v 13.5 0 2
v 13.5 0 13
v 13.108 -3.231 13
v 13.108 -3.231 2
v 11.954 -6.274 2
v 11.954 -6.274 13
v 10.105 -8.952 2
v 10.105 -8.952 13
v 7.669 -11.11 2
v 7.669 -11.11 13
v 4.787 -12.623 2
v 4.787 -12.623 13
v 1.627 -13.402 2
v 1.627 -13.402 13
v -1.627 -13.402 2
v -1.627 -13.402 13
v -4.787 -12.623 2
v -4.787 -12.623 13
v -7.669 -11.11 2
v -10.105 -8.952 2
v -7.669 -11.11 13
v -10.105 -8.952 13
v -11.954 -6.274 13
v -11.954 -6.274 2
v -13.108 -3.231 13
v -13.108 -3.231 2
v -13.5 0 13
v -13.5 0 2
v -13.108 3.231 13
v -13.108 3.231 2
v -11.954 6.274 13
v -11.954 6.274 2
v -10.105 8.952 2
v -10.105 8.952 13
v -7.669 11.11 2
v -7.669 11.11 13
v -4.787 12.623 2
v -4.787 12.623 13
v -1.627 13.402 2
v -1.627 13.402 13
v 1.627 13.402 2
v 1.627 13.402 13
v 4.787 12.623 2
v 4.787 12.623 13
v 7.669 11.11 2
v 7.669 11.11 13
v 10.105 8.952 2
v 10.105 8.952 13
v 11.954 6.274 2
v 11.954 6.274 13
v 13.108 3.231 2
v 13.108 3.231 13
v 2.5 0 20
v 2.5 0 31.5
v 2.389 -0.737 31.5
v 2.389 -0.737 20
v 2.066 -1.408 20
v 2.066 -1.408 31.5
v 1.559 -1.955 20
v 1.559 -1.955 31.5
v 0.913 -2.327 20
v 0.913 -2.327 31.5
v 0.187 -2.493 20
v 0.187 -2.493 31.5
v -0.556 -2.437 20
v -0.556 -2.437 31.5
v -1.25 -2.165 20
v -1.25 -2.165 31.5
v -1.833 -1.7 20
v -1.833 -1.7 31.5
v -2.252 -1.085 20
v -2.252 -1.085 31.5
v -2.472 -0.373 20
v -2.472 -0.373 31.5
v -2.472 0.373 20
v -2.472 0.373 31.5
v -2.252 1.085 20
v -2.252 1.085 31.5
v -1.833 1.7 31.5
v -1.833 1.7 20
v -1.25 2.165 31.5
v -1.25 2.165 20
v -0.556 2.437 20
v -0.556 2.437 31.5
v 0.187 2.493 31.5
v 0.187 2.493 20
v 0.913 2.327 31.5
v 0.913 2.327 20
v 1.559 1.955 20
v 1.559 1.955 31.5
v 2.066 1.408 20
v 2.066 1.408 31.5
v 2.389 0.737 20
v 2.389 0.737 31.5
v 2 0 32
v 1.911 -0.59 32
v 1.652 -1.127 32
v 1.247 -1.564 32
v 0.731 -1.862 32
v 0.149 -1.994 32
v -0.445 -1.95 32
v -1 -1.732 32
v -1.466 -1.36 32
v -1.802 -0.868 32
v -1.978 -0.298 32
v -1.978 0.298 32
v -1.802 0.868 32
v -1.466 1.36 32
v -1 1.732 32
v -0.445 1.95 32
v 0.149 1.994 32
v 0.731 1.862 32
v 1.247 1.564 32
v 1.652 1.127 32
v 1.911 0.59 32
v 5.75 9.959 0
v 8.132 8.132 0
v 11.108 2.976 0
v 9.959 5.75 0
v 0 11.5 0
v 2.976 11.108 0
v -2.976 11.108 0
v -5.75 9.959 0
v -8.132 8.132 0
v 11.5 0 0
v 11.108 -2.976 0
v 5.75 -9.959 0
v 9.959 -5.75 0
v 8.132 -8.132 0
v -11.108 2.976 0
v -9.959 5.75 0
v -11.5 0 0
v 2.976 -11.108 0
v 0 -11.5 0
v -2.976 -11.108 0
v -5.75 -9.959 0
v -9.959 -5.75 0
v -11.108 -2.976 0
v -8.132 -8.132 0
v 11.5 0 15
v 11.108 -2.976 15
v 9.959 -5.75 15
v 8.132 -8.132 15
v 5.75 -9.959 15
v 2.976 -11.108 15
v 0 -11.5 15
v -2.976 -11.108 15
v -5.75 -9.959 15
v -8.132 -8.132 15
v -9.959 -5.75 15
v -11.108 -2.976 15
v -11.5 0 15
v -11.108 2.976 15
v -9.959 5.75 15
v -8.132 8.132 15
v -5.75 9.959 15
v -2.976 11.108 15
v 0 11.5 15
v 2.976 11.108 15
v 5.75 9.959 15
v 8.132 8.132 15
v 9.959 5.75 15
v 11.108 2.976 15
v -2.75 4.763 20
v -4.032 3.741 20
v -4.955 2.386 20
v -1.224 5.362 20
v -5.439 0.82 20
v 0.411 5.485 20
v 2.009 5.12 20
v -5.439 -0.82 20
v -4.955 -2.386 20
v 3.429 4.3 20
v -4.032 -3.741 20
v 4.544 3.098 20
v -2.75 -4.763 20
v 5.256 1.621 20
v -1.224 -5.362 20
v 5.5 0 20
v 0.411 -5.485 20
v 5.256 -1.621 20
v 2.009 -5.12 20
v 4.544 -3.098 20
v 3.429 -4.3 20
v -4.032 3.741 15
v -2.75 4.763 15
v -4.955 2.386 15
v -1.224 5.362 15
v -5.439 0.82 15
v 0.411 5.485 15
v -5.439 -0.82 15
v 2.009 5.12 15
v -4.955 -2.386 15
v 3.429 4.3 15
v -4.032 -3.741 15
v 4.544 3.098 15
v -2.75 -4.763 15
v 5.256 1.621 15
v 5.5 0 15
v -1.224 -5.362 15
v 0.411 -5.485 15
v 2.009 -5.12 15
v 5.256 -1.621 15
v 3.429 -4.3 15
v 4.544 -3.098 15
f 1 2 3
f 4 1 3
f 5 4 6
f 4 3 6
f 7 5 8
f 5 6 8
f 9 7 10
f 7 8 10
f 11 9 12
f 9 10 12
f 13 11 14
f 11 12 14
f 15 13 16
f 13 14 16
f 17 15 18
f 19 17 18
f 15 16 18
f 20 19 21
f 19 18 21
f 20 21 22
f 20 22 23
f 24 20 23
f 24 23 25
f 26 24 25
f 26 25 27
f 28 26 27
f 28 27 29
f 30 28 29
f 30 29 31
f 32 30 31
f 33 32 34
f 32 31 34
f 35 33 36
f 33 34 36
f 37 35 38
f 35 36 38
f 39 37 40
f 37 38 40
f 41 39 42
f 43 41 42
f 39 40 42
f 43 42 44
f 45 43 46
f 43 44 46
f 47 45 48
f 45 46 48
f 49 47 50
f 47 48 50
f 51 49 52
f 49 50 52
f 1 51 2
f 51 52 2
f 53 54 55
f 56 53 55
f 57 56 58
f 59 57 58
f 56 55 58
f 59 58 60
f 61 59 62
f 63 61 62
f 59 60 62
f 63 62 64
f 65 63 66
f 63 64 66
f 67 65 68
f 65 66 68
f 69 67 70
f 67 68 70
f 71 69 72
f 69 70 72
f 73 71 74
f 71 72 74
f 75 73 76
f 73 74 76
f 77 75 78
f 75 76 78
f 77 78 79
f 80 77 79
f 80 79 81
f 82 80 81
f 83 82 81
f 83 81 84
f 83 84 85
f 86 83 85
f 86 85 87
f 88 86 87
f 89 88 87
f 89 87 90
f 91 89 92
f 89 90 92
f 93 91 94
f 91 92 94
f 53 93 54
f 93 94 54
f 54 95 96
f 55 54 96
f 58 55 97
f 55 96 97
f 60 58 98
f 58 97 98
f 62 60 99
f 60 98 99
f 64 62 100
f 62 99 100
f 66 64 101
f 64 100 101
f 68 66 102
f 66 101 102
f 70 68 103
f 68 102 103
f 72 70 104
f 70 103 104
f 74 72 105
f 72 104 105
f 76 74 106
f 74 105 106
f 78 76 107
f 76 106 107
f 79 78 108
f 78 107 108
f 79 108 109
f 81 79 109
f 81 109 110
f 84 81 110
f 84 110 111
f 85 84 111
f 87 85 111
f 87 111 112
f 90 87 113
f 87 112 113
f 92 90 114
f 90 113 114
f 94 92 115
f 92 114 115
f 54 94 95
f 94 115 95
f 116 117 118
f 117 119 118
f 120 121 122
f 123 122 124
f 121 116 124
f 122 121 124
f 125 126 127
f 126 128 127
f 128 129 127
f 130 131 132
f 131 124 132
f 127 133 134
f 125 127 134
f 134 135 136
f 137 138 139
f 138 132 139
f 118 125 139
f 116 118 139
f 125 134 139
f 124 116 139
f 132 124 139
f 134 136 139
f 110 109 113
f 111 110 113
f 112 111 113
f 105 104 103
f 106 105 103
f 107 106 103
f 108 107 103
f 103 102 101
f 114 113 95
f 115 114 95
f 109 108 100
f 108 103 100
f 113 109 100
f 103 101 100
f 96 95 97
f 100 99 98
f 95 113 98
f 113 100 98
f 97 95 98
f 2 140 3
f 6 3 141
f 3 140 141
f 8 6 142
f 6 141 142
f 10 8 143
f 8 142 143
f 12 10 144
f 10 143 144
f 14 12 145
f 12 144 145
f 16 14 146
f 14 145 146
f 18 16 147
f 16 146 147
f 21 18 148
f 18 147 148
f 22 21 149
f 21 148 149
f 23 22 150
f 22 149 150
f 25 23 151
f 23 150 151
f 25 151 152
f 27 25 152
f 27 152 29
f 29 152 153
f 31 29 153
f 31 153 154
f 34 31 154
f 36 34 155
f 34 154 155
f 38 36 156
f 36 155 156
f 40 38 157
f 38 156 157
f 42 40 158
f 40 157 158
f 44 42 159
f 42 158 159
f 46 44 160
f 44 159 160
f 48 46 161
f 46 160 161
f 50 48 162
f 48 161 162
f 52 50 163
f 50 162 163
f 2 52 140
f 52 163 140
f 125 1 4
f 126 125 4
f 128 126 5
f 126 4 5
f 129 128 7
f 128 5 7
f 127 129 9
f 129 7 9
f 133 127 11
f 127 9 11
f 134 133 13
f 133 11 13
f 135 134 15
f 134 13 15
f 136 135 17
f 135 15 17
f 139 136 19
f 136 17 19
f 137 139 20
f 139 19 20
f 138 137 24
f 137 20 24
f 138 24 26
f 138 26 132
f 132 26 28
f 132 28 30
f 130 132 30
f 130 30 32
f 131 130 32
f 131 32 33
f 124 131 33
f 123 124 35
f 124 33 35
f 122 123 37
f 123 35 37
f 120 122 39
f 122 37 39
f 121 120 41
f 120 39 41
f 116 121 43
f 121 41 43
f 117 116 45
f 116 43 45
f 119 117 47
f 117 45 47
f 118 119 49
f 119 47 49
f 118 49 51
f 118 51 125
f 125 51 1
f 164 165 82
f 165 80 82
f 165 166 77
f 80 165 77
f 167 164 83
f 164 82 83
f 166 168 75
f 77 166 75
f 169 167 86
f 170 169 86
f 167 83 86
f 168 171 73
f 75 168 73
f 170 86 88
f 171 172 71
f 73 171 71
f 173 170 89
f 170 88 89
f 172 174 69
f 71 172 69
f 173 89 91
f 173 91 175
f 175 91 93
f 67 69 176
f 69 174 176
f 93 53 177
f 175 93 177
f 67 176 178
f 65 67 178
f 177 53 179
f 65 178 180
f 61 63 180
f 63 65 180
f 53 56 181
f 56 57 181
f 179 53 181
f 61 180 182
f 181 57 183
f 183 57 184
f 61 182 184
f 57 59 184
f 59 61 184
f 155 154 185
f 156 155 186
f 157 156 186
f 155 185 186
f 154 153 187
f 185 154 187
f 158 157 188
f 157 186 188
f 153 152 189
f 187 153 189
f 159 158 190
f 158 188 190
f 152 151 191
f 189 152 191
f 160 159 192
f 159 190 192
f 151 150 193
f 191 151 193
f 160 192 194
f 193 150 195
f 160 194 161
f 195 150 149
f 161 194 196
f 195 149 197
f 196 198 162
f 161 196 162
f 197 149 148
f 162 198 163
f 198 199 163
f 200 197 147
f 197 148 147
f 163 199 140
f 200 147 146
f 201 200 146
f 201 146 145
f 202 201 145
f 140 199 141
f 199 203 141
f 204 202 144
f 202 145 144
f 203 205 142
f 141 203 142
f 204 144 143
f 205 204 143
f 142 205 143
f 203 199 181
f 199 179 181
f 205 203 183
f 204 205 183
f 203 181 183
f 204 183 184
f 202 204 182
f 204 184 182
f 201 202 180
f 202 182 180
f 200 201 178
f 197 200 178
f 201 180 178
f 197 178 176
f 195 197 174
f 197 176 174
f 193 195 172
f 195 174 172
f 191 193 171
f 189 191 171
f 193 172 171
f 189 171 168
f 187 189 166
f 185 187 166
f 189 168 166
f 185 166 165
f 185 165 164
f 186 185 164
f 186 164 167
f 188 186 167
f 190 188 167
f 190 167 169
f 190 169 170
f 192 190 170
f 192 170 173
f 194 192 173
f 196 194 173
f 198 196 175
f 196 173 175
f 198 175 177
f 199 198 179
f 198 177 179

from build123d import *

# Parameters (mm, degrees)
F2_SIZE = 2
F3_SIZE = 0.5


with BuildPart() as f1:
    # F0 (on Front) → F1 (revolve)
    with BuildSketch(Plane.XZ):
        Polygon((0, 32), (0, 0), (13.5, 0), (13.5, 15), (5.5, 15), (5.5, 20), (2.5, 20), (2.5, 32), align=None)
    revolve(axis=Axis((0, 0, 16), (0, 0, -1)))

    # F2
    f2_edges = [f1.edges().sort_by_distance(p)[0] for p in [
        (-13.5, 0, 15),
        (-13.5, 0, 0),
    ]]
    chamfer(f2_edges, length=F2_SIZE)

    # F3
    f3_edges = [f1.edges().sort_by_distance(p)[0] for p in [
        (-2.5, 0, 32),
    ]]
    chamfer(f3_edges, length=F3_SIZE)


solid = f1.part
